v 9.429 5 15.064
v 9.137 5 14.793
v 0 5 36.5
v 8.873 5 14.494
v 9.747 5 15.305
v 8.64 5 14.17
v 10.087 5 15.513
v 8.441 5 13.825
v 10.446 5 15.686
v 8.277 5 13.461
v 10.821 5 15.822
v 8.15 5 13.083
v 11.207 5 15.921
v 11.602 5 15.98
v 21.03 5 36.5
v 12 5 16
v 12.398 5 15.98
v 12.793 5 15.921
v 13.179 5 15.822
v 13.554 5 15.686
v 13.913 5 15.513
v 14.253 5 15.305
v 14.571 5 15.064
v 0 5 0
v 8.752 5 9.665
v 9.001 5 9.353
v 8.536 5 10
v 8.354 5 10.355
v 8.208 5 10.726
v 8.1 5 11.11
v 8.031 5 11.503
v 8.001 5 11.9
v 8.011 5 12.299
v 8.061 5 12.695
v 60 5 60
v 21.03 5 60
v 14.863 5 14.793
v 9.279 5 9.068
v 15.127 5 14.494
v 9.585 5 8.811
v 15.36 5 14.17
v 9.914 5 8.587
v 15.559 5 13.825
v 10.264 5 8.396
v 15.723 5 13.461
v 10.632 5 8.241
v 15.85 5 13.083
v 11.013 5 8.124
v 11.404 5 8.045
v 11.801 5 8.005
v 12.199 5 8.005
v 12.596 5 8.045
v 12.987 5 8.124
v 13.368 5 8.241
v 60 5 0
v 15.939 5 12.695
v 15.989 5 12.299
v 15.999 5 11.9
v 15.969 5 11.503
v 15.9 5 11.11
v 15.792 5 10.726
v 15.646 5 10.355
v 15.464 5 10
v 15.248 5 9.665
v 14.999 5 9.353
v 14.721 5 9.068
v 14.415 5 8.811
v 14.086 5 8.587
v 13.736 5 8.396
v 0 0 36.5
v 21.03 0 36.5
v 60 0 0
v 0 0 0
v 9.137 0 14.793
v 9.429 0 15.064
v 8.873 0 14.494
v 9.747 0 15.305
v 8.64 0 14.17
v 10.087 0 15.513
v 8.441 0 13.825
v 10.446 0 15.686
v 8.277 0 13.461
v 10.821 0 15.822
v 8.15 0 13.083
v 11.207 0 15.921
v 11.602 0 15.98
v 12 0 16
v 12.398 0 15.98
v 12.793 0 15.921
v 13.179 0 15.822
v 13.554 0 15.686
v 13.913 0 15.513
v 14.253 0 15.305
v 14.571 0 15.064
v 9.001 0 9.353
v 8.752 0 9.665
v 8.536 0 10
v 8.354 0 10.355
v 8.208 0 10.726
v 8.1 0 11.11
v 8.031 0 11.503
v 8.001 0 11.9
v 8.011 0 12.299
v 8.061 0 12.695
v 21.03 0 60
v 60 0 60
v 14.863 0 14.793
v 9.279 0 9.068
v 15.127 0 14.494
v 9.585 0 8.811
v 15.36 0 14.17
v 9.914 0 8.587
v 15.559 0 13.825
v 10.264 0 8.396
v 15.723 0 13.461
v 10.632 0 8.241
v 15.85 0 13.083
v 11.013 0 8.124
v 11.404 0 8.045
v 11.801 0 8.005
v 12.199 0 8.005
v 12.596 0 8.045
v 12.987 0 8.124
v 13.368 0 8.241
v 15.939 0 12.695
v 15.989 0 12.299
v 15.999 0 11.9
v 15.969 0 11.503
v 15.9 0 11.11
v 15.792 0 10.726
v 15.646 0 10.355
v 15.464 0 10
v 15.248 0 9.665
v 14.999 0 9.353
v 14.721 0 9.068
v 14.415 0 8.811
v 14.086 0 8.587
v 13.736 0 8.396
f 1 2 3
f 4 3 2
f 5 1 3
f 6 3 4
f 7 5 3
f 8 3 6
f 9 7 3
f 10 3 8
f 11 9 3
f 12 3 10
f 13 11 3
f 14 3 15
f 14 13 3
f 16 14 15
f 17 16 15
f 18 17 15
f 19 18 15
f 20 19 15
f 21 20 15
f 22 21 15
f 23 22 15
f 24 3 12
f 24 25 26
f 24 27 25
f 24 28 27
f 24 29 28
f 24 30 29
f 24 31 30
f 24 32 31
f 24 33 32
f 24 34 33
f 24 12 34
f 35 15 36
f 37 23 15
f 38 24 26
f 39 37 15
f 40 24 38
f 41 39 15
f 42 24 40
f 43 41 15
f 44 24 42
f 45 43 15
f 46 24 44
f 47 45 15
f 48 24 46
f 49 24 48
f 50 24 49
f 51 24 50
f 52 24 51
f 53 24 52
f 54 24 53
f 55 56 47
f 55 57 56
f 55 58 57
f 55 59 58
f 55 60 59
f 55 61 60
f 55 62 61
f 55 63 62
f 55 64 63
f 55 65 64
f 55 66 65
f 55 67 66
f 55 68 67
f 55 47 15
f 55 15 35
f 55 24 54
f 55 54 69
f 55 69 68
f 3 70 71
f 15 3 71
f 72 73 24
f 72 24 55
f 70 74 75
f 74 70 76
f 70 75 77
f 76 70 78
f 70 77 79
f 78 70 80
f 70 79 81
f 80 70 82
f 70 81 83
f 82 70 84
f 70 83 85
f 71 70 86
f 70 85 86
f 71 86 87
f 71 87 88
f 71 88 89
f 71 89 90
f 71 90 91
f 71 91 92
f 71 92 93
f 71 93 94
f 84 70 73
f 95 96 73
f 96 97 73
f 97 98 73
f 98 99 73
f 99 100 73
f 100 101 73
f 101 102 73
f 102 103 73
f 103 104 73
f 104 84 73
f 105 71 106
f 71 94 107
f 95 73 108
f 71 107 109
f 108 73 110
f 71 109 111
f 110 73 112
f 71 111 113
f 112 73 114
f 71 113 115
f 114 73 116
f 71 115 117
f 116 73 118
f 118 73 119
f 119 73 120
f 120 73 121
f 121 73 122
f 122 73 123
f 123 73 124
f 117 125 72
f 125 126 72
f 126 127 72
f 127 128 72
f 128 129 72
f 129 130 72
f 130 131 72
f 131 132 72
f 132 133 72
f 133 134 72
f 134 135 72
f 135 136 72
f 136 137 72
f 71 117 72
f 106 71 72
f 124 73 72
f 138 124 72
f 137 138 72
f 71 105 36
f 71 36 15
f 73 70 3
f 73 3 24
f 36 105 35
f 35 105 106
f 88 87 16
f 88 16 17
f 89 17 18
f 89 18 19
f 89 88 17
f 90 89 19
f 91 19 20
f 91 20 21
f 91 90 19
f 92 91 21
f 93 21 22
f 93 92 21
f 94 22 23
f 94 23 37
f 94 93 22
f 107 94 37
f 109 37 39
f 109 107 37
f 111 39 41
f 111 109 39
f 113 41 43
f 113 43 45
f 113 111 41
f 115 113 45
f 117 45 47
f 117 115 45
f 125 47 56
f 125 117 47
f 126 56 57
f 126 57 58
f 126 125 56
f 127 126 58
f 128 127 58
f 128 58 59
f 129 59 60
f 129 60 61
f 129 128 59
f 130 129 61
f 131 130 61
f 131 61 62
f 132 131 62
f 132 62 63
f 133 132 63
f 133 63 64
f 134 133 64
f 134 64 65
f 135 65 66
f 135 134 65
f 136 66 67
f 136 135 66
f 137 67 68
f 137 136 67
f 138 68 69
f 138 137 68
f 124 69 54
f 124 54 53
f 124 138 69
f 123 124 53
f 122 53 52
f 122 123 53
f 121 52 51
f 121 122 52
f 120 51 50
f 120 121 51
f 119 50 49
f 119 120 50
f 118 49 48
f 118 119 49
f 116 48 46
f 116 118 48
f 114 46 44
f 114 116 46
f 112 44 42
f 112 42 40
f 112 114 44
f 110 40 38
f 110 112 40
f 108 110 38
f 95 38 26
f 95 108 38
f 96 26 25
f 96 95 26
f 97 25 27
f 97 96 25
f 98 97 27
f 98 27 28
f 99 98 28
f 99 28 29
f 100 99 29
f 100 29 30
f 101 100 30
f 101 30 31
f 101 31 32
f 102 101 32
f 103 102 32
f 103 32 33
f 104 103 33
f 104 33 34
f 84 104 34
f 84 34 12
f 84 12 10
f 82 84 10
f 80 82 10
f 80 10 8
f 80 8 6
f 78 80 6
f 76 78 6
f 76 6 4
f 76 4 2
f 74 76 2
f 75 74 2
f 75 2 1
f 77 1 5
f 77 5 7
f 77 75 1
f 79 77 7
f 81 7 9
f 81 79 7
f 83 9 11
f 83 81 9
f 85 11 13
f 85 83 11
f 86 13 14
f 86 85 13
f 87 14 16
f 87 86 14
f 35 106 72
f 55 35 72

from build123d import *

# Parameters (mm, degrees)
SKETCH_1_W          = 60
SKETCH_1_H          = 60
SKETCH_1_R          = 4
EXTRUDE_1_DEPTH     = 5
SKETCH_2_W          = 21.03
SKETCH_2_H          = 23.5
CUT_EXTRUDE_1_DEPTH = 86


with BuildPart() as part:
    # 草图1 → 凸台-拉伸1 (new body)
    with BuildSketch(Plane(origin=(0, 0, 0), x_dir=(1, 0, 0), z_dir=(0, 1, 0))):
        with Locations((30, -30)):
            Rectangle(SKETCH_1_W, SKETCH_1_H)
        with Locations(Location((12, -12, 0), (0, 0, 270))):
            Circle(SKETCH_1_R, mode=Mode.SUBTRACT)
    extrude(amount=EXTRUDE_1_DEPTH)

    # 草图2 → 切除-拉伸1 (cut, through all)
    with BuildSketch(Plane(origin=(0, 0, 0), x_dir=(1, 0, 0), z_dir=(0, 1, 0))):
        with Locations((10.515, -48.25)):
            Rectangle(SKETCH_2_W, SKETCH_2_H)
    extrude(amount=CUT_EXTRUDE_1_DEPTH, mode=Mode.SUBTRACT)


solid = part.part
